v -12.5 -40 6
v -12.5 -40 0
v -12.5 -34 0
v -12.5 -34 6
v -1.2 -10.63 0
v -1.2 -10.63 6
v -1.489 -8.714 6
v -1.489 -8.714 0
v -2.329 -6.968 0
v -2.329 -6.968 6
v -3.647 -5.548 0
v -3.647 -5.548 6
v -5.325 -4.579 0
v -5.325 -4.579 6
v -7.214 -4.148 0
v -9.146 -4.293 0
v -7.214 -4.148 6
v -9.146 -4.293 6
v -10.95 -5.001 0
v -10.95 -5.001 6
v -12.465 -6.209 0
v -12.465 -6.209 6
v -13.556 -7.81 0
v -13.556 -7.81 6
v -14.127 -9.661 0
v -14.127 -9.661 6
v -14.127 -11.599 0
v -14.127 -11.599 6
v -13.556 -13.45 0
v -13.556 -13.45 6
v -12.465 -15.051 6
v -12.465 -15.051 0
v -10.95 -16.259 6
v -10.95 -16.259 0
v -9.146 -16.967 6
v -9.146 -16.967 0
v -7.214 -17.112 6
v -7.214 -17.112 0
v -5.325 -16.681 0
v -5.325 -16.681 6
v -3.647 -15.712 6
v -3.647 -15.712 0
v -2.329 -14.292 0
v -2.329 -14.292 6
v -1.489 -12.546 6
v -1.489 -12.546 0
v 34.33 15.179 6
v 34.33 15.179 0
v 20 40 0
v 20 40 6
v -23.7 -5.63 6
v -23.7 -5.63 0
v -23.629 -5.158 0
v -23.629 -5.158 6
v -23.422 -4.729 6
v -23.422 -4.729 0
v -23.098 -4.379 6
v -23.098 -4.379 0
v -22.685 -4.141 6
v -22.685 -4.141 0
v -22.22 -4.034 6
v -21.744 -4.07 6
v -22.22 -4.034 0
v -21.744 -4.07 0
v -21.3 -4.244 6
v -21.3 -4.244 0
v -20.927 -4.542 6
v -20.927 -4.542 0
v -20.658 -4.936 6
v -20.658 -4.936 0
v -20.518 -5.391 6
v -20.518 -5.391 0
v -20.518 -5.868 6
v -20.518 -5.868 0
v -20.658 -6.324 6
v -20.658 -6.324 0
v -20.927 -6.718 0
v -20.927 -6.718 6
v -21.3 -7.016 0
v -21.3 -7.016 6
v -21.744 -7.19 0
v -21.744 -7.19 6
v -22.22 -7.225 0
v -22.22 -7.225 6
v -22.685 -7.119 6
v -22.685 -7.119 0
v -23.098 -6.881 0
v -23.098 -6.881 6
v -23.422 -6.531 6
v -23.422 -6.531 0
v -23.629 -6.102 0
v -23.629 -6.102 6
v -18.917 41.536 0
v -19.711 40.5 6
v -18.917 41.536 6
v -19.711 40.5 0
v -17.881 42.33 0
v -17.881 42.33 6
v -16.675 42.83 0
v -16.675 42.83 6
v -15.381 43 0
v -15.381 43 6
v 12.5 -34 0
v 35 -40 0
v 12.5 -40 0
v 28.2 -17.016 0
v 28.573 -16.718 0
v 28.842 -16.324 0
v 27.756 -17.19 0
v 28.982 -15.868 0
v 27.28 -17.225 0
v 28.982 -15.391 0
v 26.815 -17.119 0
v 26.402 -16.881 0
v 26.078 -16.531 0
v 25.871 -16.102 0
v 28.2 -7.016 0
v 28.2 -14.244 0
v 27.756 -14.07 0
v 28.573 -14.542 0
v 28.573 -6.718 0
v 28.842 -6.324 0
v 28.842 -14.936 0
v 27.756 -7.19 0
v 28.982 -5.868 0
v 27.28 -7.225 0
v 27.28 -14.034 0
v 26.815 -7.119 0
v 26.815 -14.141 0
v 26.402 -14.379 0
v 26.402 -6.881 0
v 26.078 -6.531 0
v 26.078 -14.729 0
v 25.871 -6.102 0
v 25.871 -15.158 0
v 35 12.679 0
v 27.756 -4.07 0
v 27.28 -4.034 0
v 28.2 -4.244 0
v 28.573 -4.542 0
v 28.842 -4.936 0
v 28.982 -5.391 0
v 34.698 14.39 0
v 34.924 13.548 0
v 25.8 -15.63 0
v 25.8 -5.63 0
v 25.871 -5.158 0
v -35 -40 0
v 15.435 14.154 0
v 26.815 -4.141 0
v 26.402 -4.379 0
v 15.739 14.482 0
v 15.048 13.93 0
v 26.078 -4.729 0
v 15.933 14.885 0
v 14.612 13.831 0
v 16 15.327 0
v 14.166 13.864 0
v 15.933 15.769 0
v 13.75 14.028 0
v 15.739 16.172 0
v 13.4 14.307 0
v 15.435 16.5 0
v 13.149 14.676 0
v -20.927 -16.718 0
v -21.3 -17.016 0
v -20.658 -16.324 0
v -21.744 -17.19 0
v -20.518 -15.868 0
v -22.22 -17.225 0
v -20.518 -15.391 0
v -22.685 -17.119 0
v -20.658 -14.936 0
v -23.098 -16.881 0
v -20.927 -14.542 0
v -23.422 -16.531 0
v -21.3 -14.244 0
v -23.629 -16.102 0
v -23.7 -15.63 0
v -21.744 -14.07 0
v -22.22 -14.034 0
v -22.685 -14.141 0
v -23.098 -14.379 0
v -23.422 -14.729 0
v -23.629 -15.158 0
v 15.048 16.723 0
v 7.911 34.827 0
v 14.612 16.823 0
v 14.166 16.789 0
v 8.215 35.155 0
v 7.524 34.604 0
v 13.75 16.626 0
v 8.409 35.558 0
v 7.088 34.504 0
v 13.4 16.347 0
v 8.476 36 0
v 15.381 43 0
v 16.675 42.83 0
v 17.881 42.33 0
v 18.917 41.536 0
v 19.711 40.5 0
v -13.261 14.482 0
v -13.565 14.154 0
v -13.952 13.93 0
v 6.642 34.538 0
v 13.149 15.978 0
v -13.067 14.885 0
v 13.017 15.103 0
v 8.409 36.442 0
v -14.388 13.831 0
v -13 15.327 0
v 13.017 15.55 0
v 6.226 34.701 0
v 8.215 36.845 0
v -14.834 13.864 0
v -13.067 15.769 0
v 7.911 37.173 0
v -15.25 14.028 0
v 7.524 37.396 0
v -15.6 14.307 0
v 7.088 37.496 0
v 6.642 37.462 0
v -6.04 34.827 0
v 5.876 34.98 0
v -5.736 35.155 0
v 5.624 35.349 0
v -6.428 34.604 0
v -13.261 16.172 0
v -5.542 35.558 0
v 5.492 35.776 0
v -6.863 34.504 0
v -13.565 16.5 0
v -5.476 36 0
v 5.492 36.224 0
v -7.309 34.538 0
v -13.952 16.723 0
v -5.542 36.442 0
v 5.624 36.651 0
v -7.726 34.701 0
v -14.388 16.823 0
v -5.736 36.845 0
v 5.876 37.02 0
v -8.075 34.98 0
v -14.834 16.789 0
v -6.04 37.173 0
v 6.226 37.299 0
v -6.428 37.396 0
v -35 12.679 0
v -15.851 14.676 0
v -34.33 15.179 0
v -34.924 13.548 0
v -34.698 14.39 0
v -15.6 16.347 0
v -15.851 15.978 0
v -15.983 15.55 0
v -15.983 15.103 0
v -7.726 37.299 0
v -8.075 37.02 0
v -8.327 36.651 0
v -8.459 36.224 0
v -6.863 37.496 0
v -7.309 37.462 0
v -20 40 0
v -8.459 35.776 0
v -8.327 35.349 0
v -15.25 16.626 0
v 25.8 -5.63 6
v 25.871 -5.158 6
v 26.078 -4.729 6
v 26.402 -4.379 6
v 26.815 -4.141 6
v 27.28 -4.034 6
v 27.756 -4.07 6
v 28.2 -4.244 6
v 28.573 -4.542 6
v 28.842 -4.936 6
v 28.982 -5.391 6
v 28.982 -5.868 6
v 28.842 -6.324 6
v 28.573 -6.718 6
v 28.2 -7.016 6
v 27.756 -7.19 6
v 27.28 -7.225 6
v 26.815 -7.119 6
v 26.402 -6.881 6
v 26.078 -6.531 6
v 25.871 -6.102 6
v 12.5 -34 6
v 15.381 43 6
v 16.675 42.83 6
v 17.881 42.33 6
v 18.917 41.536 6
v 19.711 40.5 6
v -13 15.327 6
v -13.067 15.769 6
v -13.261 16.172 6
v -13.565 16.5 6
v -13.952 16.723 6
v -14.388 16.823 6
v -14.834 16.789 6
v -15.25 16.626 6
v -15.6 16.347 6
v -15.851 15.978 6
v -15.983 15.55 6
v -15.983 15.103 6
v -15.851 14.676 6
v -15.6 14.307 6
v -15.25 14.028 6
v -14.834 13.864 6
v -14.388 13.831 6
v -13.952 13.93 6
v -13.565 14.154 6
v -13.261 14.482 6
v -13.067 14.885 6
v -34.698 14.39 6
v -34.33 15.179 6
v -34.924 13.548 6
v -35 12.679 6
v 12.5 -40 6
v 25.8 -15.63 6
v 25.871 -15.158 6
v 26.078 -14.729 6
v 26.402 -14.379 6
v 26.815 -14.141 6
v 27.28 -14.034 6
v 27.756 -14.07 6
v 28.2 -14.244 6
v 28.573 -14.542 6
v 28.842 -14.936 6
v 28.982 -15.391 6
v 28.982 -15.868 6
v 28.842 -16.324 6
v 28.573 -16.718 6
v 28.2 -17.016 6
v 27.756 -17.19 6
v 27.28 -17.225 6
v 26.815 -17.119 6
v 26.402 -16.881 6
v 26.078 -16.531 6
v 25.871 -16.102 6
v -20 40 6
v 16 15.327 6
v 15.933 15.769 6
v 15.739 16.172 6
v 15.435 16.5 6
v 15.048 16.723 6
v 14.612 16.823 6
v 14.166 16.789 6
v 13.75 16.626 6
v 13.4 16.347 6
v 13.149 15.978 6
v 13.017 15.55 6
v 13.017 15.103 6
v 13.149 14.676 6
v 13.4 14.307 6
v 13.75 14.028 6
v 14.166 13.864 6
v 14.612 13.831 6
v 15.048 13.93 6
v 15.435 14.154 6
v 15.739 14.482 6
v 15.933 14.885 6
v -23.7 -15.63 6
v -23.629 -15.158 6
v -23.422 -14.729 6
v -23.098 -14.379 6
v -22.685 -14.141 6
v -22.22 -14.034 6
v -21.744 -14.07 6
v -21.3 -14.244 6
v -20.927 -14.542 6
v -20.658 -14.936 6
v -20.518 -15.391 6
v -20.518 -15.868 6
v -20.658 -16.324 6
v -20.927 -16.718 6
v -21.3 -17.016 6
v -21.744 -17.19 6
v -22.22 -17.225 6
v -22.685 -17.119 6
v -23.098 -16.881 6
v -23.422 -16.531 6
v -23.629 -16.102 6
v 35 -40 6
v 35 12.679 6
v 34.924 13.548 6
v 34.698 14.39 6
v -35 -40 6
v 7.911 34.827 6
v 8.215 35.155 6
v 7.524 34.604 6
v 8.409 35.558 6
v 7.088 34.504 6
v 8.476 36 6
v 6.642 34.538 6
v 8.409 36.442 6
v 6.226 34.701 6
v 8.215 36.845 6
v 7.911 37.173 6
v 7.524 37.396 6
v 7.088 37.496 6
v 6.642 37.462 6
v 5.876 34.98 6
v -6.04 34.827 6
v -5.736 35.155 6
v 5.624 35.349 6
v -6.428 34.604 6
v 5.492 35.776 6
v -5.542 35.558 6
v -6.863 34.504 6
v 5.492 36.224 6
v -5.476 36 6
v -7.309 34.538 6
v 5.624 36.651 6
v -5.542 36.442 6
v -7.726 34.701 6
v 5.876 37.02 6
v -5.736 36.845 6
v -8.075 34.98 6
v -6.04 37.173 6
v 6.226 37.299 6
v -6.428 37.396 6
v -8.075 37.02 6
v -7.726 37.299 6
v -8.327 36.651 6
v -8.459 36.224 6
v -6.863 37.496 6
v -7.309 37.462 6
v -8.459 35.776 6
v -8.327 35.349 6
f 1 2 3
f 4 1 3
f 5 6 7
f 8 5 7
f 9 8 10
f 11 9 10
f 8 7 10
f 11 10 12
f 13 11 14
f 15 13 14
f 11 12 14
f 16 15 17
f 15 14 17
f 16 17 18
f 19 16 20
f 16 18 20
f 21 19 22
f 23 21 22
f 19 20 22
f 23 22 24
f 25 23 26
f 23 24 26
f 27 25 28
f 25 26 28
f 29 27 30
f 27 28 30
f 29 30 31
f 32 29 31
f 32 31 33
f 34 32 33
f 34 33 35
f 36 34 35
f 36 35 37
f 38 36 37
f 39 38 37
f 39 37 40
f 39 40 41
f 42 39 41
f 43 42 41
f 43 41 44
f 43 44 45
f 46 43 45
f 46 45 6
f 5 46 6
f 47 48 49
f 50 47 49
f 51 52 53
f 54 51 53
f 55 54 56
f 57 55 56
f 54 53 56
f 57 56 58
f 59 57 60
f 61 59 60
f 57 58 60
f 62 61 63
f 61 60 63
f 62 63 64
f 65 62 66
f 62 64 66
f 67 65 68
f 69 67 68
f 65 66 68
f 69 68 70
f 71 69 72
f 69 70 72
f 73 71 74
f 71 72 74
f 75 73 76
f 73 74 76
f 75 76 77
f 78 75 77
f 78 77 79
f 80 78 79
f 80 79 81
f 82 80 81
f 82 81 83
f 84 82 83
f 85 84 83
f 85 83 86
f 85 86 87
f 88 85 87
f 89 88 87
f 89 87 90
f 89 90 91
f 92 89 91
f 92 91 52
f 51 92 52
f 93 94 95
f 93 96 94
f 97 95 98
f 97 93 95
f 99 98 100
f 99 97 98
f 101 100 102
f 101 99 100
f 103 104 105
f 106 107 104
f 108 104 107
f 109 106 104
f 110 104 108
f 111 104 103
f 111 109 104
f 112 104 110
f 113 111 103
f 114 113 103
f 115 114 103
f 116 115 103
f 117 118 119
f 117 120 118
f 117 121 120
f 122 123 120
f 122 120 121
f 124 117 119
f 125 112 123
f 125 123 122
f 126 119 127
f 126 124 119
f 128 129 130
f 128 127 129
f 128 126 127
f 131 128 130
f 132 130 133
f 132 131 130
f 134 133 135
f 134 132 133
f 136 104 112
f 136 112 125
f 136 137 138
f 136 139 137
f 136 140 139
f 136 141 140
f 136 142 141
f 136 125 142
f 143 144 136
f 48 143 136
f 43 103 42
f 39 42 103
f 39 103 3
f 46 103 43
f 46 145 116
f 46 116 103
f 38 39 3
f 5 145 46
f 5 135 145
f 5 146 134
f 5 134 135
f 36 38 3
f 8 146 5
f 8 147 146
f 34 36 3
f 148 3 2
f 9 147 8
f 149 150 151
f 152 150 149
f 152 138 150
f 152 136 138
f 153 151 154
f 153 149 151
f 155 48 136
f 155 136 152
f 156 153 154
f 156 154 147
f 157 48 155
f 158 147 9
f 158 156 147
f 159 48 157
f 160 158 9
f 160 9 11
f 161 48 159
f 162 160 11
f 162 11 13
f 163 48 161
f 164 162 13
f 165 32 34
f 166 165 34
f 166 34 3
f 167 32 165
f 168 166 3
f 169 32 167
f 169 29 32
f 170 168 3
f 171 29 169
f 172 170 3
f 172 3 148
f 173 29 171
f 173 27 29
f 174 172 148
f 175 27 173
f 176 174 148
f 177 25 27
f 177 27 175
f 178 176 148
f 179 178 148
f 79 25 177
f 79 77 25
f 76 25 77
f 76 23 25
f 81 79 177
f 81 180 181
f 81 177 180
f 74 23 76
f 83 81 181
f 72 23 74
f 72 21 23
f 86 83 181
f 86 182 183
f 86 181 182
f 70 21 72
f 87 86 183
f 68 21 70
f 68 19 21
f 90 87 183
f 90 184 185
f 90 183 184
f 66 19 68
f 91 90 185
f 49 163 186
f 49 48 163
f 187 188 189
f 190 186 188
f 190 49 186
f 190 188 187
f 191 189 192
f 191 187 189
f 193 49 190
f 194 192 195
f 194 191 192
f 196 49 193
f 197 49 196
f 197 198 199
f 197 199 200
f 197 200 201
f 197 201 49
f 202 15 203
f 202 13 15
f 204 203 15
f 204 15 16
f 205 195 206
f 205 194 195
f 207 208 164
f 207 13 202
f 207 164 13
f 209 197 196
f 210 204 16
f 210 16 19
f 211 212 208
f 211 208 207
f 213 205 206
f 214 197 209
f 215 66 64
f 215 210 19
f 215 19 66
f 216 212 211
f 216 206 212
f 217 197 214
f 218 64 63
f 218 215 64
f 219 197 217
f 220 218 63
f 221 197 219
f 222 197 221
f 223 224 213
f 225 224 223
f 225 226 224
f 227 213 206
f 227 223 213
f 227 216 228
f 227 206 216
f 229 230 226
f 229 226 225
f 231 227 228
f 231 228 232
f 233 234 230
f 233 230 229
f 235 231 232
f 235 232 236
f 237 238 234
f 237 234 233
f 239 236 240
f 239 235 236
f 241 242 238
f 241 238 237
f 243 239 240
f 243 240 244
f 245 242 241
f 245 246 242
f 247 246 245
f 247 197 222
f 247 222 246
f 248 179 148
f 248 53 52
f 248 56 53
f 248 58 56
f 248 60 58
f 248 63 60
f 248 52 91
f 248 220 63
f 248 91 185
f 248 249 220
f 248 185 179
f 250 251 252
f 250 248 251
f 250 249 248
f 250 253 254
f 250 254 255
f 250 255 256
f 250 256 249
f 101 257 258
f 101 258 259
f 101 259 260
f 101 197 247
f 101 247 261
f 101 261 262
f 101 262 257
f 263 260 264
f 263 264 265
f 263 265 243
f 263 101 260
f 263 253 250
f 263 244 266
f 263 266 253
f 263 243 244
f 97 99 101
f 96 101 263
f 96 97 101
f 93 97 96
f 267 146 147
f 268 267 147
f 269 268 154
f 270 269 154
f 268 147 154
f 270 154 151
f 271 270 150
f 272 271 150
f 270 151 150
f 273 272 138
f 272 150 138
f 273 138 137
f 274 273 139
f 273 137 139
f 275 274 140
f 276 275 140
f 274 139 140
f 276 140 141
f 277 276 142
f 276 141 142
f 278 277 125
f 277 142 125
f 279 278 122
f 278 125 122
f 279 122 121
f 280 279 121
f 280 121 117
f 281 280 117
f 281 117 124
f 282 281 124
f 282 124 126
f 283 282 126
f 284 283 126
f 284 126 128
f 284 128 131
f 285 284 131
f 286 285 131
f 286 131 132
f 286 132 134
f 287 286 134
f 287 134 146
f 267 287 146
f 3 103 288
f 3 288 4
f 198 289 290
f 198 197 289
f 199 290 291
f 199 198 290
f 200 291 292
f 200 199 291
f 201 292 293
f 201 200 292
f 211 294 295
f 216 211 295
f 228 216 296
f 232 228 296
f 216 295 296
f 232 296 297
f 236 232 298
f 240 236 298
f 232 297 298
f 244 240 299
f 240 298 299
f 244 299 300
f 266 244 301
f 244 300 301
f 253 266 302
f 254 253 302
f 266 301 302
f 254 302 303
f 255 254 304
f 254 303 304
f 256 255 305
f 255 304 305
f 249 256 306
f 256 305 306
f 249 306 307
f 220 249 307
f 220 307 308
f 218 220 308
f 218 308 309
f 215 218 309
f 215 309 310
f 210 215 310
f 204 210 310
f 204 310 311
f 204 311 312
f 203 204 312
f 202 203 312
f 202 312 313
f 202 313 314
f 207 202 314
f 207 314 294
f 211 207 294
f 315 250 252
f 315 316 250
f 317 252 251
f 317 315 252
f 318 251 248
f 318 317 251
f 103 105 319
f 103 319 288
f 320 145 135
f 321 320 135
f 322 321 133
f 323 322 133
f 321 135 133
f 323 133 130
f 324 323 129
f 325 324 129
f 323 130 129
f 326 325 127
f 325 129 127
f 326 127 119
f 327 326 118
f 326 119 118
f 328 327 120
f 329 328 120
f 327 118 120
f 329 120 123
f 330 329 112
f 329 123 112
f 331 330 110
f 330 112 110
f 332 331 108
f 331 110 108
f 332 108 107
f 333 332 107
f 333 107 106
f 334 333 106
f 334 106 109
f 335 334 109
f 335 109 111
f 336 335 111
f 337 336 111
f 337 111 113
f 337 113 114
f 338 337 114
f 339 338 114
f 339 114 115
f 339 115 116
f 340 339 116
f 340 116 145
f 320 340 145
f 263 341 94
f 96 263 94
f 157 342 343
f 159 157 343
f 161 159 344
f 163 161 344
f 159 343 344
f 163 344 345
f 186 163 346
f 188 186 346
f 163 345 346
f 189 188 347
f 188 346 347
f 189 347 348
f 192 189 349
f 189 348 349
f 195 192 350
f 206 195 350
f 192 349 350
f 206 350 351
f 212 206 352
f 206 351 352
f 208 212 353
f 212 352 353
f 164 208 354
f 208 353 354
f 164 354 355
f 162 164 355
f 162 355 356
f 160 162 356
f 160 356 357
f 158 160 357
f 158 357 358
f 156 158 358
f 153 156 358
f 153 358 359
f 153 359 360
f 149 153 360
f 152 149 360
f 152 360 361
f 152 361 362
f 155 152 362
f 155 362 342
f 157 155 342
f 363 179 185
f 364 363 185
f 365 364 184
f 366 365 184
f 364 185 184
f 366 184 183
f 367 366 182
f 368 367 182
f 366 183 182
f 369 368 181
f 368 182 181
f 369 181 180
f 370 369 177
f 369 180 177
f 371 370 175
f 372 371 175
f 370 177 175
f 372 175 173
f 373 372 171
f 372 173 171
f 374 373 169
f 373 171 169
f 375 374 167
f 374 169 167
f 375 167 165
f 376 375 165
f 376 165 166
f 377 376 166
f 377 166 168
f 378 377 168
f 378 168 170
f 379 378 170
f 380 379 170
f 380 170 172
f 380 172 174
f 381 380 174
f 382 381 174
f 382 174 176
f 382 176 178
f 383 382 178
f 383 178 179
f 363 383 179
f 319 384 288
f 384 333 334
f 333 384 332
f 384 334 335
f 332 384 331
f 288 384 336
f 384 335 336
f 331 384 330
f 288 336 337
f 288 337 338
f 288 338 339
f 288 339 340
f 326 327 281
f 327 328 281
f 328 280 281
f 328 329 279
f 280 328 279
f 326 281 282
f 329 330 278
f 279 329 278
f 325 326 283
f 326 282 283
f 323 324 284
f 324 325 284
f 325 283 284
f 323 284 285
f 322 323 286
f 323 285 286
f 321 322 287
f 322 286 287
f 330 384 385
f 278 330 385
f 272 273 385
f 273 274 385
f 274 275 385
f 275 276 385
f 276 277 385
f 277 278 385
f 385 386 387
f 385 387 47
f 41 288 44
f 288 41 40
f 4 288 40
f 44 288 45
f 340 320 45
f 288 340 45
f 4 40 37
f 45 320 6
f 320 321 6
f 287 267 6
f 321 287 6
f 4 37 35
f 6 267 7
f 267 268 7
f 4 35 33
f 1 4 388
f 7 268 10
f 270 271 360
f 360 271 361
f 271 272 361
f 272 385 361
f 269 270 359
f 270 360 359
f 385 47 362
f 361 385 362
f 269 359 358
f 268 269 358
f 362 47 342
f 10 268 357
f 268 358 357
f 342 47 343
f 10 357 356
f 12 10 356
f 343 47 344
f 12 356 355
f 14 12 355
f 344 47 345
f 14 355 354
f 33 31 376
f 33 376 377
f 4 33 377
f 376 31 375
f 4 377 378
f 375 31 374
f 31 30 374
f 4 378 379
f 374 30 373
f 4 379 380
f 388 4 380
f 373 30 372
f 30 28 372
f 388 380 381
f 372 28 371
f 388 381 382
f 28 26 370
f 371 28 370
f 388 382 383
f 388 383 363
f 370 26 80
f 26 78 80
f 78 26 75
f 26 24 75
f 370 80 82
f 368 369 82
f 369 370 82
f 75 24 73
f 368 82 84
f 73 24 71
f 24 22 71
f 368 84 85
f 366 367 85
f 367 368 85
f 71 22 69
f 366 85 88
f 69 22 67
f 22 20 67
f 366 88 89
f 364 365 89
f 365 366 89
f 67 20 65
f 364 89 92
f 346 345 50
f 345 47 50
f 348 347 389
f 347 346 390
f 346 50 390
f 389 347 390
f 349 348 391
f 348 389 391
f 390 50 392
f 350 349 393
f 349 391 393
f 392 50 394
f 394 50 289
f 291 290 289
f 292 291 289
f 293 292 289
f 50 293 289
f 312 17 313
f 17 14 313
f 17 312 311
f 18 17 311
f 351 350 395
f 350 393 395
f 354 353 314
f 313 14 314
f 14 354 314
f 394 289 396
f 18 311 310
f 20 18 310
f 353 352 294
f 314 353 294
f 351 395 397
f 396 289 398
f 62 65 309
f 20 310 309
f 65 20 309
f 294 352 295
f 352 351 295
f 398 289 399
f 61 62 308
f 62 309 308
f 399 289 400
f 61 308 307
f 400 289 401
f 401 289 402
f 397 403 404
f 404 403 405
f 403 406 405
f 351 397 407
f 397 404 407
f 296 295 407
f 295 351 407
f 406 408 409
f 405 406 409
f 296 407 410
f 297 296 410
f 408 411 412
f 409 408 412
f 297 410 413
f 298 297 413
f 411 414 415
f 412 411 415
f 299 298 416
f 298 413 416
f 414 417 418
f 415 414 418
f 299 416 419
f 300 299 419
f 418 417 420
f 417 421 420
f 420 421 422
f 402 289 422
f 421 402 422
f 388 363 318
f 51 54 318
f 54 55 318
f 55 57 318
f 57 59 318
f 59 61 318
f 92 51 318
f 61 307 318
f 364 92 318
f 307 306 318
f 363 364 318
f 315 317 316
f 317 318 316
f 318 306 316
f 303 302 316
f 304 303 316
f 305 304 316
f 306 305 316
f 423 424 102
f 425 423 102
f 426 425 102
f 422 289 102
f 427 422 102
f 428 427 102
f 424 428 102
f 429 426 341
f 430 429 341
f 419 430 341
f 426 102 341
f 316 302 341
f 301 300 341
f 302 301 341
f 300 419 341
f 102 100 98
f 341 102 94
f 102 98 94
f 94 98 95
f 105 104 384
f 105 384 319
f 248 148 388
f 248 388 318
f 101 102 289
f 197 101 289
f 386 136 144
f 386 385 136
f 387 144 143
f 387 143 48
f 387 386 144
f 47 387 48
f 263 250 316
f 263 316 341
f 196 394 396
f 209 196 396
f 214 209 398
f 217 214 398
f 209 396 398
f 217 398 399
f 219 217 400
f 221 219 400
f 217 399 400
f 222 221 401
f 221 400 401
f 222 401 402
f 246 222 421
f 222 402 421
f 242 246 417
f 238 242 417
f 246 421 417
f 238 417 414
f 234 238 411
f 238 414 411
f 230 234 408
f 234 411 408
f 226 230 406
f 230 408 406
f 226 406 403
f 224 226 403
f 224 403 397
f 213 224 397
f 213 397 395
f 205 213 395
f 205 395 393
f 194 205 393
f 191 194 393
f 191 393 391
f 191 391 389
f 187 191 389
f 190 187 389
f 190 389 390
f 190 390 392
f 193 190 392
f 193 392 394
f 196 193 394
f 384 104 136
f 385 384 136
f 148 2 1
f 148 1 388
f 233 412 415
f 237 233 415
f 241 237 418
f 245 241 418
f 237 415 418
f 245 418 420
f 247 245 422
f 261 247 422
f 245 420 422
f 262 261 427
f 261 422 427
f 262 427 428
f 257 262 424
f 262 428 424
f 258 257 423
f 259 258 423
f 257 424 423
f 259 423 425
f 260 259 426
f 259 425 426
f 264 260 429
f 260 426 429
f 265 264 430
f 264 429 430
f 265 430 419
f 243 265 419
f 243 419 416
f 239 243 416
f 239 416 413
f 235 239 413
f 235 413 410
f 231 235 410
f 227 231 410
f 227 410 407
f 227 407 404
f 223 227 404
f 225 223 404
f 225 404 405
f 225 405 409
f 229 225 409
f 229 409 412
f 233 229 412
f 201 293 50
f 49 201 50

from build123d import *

# Parameters (mm, degrees)
EXTRUSION1_DEPTH = 6
HOLE1_D          = 3
HOLE2_D          = 3.2
SKETCH6_W        = 25
SKETCH6_H        = 6
EXTRUSION3_DEPTH = 10
EXTRUSION4_DEPTH = 6
FILLET1_R        = 5
SKETCH8_R        = 6.5
EXTRUSION5_DEPTH = 10


with BuildPart() as part:
    # Sketch1 → Extrusion1 (new body)
    with BuildSketch(Plane.XY):
        Polygon((35, -40), (35, 14.019237886), (20, 40), (0, 40), (0, -40), align=None)
    extrusion1 = extrude(amount=EXTRUSION1_DEPTH)

    # Mirror1: Extrusion1 across plane
    add(extrusion1.mirror(Plane(origin=(0, -8, 3), x_dir=(0, 0, 1), z_dir=(-1, 0, 0))))

    # Hole1 (through all)
    with Locations(Plane(origin=(0, 0, 0), x_dir=(-1, 0, 0), z_dir=(0, 0, -1))):
        with Locations((-6.975556847, 36), (-14.5, 15.326762343), (14.5, 15.326762343), (6.975556847, 36)):
            Hole(HOLE1_D / 2)

    # Hole2 (through all)
    with Locations(Plane.XY.offset(6)):
        with Locations((-22.1, -5.629932362), (-22.1, -15.629932362), (27.4, -15.629932362), (27.4, -5.629932362)):
            Hole(HOLE2_D / 2)

    # Sketch6 → Extrusion3 (cut)
    with BuildSketch(Plane(origin=(0, 0, 0), x_dir=(-1, 0, 0), z_dir=(0, 0, -1))):
        with Locations((0, -37)):
            Rectangle(SKETCH6_W, SKETCH6_H)
    extrude(amount=-EXTRUSION3_DEPTH, mode=Mode.SUBTRACT)

    # Sketch7 → Extrusion4 (add)
    with BuildSketch(Plane.XY.offset(6)):
        Polygon((-20, 40), (-18.267949192, 43), (18.267949192, 43), (20, 40), align=None)
    extrude(amount=-EXTRUSION4_DEPTH)

    # Fillet1
    fillet1_edges = [part.edges().sort_by_distance(p)[0] for p in [
        (-35, 14.019237886, 3),
        (-18.267949192, 43, 3),
        (18.267949192, 43, 3),
        (35, 14.019237886, 3),
    ]]
    fillet(fillet1_edges, radius=FILLET1_R)

    # Sketch8 → Extrusion5 (cut)
    with BuildSketch(Plane.XY.offset(6)):
        with Locations((-7.7, -10.629932362)):
            Circle(SKETCH8_R)
    extrude(amount=-EXTRUSION5_DEPTH, mode=Mode.SUBTRACT)


solid = part.part
